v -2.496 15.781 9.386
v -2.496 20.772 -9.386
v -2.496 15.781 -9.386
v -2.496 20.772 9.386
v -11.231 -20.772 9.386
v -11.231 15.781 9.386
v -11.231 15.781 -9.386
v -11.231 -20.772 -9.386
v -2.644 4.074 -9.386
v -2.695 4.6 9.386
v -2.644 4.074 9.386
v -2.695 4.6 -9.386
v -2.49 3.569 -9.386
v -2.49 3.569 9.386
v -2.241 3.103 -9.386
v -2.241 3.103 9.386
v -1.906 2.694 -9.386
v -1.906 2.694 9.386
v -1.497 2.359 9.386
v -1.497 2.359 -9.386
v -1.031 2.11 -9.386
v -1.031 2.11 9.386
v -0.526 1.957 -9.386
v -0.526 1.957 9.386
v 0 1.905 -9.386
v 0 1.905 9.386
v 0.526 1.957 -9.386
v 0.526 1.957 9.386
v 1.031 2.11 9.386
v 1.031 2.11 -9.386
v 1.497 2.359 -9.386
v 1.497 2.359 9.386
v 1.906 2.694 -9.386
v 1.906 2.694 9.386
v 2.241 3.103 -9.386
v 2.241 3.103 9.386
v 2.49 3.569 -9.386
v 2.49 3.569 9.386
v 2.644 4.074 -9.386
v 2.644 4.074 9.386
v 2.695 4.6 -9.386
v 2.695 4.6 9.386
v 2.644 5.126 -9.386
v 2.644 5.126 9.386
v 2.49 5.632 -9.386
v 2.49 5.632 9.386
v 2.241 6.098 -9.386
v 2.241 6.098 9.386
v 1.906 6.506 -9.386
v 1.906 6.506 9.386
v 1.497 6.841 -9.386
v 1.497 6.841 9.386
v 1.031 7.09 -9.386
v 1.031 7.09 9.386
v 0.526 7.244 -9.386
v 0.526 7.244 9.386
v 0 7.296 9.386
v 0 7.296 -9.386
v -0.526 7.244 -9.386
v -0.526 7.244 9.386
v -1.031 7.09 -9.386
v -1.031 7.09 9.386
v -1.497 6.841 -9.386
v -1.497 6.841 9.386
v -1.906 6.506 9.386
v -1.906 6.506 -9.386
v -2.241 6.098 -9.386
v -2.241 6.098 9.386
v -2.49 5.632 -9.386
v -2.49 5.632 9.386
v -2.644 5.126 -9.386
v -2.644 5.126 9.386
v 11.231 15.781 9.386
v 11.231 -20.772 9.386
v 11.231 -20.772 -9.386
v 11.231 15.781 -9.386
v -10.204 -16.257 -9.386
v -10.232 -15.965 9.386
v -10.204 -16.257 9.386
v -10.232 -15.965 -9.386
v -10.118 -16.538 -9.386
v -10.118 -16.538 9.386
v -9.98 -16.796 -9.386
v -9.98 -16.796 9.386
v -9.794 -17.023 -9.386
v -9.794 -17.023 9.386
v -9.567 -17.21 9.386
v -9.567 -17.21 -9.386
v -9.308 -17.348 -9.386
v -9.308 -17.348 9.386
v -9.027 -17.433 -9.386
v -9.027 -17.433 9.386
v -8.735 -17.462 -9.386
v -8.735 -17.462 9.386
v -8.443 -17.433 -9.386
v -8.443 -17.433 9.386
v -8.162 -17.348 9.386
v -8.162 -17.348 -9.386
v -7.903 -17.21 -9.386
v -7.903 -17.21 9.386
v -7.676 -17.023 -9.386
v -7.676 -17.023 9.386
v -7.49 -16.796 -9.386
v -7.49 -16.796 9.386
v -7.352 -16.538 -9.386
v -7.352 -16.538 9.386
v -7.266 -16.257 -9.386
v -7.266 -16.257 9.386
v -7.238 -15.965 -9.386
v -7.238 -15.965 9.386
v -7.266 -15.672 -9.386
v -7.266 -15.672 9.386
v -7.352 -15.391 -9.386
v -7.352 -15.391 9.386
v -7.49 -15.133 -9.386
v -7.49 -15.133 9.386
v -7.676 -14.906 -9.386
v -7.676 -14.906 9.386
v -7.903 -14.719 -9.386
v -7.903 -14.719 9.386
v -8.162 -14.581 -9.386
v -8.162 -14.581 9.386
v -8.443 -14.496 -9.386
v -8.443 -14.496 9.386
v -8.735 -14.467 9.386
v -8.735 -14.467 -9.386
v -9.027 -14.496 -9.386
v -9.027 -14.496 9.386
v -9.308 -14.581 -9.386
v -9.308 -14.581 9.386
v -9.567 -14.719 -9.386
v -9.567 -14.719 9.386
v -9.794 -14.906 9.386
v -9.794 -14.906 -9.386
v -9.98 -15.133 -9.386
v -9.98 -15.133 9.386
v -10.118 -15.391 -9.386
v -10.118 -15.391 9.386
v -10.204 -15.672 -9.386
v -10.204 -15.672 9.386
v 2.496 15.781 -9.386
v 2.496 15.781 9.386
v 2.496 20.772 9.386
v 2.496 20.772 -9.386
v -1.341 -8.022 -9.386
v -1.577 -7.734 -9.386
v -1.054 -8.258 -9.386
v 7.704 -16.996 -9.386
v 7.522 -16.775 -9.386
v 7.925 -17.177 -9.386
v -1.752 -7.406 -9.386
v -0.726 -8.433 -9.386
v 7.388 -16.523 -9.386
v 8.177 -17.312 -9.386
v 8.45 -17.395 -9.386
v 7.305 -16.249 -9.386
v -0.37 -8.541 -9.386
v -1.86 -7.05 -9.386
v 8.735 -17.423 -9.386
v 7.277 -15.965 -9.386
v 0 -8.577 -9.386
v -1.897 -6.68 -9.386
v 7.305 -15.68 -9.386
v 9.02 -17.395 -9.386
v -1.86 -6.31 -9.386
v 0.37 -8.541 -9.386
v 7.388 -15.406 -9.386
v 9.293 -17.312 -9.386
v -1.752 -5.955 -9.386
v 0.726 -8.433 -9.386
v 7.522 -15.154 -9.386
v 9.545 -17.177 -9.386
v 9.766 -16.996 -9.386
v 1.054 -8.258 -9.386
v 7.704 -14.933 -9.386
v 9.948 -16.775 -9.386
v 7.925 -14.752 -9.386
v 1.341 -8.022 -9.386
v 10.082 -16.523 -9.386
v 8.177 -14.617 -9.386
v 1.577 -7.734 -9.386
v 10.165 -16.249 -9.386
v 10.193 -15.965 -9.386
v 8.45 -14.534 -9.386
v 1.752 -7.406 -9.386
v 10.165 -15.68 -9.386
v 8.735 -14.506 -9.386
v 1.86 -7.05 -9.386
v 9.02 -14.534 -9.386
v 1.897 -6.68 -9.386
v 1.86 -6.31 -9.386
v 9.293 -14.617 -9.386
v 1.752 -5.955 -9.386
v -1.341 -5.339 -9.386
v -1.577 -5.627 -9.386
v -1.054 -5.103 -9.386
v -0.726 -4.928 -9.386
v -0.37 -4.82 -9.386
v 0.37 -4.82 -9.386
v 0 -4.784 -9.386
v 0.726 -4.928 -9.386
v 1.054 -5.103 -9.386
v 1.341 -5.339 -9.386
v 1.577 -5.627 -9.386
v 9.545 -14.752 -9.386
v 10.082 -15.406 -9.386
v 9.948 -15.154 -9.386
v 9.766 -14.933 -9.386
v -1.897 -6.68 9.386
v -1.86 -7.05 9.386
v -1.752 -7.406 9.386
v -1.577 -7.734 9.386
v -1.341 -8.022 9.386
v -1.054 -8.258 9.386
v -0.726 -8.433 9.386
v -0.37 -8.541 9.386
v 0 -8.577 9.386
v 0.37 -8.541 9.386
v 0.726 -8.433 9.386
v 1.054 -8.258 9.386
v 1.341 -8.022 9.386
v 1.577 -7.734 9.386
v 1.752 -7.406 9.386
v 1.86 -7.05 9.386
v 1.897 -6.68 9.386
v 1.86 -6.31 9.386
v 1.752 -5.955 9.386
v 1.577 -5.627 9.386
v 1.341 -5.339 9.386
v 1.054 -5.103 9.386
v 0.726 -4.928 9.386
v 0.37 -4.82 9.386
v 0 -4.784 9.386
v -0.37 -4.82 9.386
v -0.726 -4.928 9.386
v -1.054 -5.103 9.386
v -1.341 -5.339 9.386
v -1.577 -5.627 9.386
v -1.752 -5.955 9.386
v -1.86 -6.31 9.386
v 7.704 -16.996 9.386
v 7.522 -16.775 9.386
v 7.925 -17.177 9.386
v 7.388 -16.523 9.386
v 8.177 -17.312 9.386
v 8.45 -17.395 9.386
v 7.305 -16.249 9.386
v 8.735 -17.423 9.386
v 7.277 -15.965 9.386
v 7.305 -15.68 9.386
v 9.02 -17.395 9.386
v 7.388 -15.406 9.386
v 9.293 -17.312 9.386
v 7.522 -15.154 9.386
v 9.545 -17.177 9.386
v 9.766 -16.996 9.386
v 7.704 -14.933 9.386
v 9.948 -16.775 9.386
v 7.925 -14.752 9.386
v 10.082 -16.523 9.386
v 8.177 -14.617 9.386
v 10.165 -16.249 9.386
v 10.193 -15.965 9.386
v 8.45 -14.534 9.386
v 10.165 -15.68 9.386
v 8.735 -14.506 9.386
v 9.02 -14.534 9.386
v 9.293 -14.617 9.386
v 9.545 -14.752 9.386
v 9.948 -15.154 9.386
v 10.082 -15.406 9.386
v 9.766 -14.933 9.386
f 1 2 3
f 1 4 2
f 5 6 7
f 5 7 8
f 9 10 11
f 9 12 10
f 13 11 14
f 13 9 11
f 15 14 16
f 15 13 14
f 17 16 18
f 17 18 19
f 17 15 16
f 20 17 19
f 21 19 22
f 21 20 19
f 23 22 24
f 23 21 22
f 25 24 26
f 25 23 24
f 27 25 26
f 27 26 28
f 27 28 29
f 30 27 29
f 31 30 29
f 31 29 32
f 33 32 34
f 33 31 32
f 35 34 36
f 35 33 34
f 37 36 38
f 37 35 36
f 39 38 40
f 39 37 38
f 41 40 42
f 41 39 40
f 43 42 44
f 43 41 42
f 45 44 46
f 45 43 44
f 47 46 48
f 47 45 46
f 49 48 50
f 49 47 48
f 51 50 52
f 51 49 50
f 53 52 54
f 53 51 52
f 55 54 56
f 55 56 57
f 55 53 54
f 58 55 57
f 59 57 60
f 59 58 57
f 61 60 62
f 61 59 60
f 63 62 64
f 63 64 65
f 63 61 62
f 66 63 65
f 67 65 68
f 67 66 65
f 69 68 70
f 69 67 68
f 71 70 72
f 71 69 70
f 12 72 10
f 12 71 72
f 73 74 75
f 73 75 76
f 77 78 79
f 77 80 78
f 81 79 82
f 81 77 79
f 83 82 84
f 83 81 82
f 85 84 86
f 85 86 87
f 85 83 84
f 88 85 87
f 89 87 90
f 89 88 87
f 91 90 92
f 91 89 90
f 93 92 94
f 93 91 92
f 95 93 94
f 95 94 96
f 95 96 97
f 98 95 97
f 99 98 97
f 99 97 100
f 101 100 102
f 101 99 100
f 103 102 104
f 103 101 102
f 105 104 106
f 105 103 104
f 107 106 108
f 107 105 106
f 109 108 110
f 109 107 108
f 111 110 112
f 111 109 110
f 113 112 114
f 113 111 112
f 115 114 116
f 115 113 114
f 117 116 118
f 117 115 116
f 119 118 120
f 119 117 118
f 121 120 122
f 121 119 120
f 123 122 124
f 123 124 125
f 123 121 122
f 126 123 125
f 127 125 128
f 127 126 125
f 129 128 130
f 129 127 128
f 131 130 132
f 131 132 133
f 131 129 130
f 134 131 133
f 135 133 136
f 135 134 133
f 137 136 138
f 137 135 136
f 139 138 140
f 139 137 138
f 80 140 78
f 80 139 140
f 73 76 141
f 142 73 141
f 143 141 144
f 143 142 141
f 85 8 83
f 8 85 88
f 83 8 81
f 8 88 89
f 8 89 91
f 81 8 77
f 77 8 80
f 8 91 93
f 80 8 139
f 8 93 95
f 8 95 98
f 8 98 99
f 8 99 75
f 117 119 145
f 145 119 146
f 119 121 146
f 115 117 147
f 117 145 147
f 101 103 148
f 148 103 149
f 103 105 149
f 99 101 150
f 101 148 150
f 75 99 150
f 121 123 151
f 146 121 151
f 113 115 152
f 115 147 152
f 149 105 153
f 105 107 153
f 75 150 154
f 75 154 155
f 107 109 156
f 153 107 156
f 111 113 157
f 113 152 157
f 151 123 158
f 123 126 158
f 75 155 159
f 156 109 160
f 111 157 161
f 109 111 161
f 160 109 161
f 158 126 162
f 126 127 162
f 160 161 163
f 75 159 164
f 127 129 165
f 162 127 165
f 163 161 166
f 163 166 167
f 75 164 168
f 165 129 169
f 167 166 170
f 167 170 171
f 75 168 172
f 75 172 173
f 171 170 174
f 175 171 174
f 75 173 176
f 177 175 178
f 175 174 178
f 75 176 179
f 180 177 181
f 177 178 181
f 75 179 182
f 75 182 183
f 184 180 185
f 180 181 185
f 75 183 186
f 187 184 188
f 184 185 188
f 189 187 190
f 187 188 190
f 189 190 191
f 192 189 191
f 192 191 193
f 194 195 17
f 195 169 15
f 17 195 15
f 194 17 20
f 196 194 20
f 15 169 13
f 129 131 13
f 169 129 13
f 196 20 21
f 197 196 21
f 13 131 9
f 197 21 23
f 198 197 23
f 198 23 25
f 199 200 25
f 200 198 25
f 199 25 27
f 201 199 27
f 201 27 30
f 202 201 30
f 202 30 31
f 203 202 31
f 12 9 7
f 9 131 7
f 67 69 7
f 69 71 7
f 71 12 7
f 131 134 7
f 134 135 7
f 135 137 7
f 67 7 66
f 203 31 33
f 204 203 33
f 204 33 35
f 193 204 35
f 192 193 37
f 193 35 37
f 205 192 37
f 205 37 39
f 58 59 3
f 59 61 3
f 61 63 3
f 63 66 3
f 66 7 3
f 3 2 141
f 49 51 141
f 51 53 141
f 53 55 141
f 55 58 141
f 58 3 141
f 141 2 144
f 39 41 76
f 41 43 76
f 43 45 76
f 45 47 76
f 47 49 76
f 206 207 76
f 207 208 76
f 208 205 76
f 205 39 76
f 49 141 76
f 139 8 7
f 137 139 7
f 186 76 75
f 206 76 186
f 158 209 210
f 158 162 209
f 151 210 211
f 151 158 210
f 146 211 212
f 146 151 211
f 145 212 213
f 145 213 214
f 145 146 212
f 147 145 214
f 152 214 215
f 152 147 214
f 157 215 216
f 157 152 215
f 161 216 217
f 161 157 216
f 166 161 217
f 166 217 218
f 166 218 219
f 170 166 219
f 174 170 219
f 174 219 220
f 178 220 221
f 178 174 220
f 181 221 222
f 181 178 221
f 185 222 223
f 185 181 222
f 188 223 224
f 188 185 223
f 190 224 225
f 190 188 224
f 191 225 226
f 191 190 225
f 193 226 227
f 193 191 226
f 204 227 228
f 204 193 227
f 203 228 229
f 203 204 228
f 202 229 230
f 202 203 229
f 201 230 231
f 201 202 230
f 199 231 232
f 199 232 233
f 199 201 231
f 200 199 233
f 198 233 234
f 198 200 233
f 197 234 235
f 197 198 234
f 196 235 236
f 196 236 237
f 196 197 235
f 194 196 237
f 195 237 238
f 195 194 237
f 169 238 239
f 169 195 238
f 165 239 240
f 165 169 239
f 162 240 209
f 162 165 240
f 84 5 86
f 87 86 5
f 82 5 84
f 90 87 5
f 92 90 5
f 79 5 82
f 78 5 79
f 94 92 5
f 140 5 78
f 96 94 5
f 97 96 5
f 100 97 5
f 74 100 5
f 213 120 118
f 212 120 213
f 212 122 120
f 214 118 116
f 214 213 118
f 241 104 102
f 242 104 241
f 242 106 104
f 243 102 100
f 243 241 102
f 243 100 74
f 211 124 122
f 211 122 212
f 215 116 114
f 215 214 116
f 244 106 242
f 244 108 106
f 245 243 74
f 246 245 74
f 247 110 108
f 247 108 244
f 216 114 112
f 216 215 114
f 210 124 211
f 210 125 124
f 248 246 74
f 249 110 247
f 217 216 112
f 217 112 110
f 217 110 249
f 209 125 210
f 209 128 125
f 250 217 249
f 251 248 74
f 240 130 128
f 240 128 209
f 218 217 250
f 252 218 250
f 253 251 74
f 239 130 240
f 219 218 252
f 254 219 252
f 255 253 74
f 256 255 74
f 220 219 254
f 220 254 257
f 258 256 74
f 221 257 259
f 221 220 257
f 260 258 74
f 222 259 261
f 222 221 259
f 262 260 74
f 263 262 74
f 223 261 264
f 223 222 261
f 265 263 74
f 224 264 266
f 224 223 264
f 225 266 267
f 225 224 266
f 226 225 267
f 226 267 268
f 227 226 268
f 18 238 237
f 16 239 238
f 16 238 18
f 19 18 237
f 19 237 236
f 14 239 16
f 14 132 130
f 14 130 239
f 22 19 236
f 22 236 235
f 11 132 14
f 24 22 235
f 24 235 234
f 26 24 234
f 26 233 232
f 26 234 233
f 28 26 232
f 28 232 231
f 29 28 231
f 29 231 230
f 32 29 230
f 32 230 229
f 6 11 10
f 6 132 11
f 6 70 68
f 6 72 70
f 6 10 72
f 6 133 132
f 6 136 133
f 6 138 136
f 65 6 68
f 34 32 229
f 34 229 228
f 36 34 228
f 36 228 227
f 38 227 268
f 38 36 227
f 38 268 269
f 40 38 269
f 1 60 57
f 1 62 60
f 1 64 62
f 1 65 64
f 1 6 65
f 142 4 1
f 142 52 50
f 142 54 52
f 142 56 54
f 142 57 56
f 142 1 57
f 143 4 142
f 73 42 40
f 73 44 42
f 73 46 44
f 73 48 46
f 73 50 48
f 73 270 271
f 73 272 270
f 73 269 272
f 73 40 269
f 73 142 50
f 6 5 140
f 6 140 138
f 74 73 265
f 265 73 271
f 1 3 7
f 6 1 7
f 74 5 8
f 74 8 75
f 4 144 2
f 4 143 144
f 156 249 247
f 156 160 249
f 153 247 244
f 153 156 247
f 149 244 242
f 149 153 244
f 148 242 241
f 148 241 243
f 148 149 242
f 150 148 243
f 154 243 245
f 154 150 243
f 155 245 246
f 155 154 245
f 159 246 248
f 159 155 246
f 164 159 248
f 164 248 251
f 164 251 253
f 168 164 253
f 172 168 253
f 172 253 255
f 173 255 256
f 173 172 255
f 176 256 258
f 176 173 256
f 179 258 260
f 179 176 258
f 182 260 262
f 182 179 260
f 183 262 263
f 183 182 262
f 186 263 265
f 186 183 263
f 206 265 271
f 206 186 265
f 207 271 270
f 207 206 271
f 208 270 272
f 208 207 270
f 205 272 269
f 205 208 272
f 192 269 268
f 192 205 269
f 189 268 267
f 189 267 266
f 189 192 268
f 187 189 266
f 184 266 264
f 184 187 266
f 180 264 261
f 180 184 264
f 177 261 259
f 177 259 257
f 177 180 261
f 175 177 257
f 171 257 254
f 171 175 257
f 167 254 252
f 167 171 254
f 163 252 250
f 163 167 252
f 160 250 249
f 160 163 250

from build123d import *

# Parameters (mm, degrees)
SKETCH1_R           = 1.896742857
SKETCH1_R_2         = 1.45833049
SKETCH1_R_3         = 1.497428571
SKETCH1_R_4         = 2.695371429
BOSS_EXTRUDE1_DEPTH = 9.3865


with BuildPart() as part:
    # Sketch1 → Boss-Extrude1 (new, symmetric)
    with BuildSketch(Plane.XY):
        Polygon((-2.495714286, 15.780977349), (-11.230714286, 15.780977349), (-11.230714286, -20.77240592), (11.230714286, -20.77240592), (11.230714286, 15.780977349), (2.495714286, 15.780977349), (2.495714286, 20.77240592), (-2.495714286, 20.77240592), align=None)
        with Locations(Location((0, -6.680451222, 0), (0, 0, 180))):
            Circle(SKETCH1_R, mode=Mode.SUBTRACT)
        with Locations(Location((8.735, -15.964508365, 0), (0, 0, 180))):
            Circle(SKETCH1_R_2, mode=Mode.SUBTRACT)
        with Locations(Location((-8.735, -15.964508365, 0), (0, 0, 180))):
            Circle(SKETCH1_R_3, mode=Mode.SUBTRACT)
        with Locations(Location((0, 4.600177349, 0), (0, 0, 180))):
            Circle(SKETCH1_R_4, mode=Mode.SUBTRACT)
    extrude(amount=BOSS_EXTRUDE1_DEPTH, both=True)


solid = part.part
